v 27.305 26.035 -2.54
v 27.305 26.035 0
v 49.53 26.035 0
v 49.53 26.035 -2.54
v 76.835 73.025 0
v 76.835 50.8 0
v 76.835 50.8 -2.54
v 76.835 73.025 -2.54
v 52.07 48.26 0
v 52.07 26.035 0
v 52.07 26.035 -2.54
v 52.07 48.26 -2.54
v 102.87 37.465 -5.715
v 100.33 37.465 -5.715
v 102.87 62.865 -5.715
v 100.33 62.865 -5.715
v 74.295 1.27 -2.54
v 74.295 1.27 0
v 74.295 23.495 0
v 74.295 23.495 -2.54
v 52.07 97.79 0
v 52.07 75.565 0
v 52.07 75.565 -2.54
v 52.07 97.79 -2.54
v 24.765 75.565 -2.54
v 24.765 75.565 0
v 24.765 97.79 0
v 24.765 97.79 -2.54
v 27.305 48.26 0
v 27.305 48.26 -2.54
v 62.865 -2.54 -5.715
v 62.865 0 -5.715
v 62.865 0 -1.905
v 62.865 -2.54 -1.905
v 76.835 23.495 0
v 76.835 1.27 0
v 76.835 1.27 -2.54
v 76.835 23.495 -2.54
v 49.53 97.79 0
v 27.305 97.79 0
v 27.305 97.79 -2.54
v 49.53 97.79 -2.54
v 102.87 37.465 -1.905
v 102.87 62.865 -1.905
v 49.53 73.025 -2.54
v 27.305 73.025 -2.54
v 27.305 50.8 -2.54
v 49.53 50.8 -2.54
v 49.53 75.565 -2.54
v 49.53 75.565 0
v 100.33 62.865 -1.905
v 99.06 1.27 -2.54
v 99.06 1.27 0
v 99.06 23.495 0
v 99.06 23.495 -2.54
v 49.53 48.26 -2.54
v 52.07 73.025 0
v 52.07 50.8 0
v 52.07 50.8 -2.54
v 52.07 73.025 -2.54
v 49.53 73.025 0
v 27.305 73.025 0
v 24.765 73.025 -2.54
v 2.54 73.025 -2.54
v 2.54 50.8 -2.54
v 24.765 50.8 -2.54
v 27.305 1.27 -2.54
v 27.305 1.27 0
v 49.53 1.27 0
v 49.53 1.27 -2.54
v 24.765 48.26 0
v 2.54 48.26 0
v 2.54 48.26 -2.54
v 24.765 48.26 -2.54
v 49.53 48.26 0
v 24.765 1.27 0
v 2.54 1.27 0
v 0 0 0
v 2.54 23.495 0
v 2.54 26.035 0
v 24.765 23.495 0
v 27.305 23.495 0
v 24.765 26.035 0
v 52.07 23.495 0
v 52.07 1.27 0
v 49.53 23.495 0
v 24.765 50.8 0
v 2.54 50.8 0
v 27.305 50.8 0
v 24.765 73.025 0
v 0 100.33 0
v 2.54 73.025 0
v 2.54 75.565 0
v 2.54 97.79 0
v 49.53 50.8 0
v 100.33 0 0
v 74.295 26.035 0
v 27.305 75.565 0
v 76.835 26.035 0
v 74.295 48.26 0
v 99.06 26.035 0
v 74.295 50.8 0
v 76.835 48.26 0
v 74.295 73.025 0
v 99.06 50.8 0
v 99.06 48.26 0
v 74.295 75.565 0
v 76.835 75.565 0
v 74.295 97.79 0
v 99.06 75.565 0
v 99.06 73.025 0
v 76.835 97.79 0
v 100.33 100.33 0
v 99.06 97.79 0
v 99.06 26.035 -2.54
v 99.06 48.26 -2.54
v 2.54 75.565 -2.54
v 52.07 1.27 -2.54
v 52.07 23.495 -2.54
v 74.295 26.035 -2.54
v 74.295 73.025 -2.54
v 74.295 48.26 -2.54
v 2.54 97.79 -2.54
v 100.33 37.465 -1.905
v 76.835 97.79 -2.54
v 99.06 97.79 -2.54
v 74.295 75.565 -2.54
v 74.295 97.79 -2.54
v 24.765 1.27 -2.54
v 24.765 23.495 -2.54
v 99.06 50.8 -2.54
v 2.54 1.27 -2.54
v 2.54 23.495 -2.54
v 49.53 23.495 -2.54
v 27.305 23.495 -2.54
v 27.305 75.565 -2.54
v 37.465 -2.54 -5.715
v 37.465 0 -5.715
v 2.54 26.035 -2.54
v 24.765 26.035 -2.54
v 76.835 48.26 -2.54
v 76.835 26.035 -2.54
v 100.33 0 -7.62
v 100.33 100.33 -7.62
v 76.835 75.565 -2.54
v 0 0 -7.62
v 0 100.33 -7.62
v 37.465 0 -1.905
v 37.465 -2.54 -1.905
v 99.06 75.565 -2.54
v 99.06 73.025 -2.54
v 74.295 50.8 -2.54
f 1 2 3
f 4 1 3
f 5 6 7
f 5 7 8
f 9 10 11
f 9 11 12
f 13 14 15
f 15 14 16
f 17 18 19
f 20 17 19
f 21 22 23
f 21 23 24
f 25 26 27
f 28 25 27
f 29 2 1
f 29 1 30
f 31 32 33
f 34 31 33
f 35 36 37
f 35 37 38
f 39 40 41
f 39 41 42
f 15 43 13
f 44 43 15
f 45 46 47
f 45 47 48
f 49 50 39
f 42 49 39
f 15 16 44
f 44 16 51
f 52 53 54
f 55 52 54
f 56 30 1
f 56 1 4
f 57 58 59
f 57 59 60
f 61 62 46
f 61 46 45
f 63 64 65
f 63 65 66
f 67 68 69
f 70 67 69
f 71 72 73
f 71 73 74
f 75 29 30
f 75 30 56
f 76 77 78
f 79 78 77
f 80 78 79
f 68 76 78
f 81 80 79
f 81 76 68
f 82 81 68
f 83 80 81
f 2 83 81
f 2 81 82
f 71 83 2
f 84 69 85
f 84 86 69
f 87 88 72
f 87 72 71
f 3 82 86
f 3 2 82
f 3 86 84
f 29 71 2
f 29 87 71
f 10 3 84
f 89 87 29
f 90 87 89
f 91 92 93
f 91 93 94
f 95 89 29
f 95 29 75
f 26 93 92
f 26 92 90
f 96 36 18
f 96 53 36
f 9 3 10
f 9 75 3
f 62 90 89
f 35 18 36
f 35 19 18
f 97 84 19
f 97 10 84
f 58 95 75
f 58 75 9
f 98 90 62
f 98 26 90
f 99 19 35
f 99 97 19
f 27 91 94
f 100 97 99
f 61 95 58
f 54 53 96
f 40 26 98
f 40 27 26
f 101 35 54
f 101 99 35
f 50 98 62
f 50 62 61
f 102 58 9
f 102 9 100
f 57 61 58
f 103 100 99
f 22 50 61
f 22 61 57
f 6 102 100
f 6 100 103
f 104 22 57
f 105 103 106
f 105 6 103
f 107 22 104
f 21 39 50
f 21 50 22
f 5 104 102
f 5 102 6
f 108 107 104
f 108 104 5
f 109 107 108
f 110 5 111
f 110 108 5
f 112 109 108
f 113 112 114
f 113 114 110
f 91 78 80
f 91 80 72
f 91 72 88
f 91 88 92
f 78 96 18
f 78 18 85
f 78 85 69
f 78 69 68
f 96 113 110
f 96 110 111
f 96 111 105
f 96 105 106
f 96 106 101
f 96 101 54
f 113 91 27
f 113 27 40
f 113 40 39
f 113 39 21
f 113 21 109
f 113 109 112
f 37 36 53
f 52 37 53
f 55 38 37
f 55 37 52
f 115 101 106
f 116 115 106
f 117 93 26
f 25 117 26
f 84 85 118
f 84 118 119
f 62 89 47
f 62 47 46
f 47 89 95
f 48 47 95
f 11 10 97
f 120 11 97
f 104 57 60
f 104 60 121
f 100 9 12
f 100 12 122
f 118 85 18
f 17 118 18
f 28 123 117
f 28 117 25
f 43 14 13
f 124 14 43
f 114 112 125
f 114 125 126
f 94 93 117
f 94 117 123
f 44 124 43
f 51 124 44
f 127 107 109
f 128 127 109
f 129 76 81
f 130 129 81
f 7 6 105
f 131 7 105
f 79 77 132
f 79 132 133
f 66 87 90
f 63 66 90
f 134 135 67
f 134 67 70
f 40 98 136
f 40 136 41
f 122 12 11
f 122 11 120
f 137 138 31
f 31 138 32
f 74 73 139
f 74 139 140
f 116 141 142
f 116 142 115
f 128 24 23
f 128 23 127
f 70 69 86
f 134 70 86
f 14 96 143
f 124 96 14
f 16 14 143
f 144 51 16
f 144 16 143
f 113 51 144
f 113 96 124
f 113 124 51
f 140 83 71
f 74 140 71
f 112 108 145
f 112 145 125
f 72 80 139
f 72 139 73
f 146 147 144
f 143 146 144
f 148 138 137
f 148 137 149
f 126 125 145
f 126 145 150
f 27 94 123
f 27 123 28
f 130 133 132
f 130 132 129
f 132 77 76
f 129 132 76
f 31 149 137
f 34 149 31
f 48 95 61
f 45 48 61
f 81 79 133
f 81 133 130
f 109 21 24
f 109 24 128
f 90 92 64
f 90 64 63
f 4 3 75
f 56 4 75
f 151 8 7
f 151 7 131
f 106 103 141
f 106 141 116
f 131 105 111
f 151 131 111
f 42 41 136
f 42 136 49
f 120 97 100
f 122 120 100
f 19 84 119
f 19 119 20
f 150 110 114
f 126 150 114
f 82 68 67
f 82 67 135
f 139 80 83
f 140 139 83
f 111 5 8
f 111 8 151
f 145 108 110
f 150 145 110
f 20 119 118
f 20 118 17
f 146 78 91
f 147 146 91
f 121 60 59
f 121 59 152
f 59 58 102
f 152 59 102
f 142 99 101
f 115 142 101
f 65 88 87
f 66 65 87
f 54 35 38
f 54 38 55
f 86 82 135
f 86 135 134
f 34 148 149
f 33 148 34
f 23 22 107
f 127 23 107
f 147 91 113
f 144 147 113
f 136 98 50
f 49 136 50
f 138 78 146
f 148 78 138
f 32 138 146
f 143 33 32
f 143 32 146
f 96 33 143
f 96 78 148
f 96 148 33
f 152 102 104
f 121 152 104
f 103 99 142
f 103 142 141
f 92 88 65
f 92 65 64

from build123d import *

# Parameters (mm, degrees)
F0_W     = 100.33
F0_H     = 100.33
F1_DEPTH = 7.62
F2_W     = 22.225
F2_H     = 22.225
F3_DEPTH = 2.54
F5_W     = 25.4
F5_H     = 3.81
F6_DEPTH = 2.54
F4_W     = 25.4
F4_H     = 3.81
F7_DEPTH = 2.54


with BuildPart() as f1:
    # F0 (on Top) → F1 (new body)
    with BuildSketch(Plane.XY):
        with Locations((50.165, 50.165)):
            Rectangle(F0_W, F0_H)
    extrude(amount=-F1_DEPTH)

    # F2 (on Top) → F3 (cut)
    with BuildSketch(Plane.XY):
        with Locations((13.6525, 86.6775)):
            Rectangle(F2_W, F2_H)
        with Locations((38.4175, 86.6775)):
            Rectangle(F2_W, F2_H)
        with Locations((63.1825, 86.6775)):
            Rectangle(F2_W, F2_H)
        with Locations((87.9475, 86.6775)):
            Rectangle(F2_W, F2_H)
        with Locations((13.6525, 61.9125)):
            Rectangle(F2_W, F2_H)
        with Locations((13.6525, 37.1475)):
            Rectangle(F2_W, F2_H)
        with Locations((13.6525, 12.3825)):
            Rectangle(F2_W, F2_H)
        with Locations((38.4175, 61.9125)):
            Rectangle(F2_W, F2_H)
        with Locations((63.1825, 61.9125)):
            Rectangle(F2_W, F2_H)
        with Locations((87.9475, 61.9125)):
            Rectangle(F2_W, F2_H)
        with Locations((38.4175, 37.1475)):
            Rectangle(F2_W, F2_H)
        with Locations((38.4175, 12.3825)):
            Rectangle(F2_W, F2_H)
        with Locations((63.1825, 37.1475)):
            Rectangle(F2_W, F2_H)
        with Locations((87.9475, 37.1475)):
            Rectangle(F2_W, F2_H)
        with Locations((63.1825, 12.3825)):
            Rectangle(F2_W, F2_H)
        with Locations((87.9475, 12.3825)):
            Rectangle(F2_W, F2_H)
    extrude(amount=-F3_DEPTH, mode=Mode.SUBTRACT)

    # F5 (on face) → F6 (join)
    with BuildSketch(Plane.YZ.offset(100.33)):
        with Locations((50.165, -3.81)):
            Rectangle(F5_W, F5_H)
    extrude(amount=F6_DEPTH)

    # F4 (on face) → F7 (join)
    with BuildSketch(Plane.XZ):
        with Locations((50.165, -3.81)):
            Rectangle(F4_W, F4_H)
    extrude(amount=F7_DEPTH)


solid = f1.part
